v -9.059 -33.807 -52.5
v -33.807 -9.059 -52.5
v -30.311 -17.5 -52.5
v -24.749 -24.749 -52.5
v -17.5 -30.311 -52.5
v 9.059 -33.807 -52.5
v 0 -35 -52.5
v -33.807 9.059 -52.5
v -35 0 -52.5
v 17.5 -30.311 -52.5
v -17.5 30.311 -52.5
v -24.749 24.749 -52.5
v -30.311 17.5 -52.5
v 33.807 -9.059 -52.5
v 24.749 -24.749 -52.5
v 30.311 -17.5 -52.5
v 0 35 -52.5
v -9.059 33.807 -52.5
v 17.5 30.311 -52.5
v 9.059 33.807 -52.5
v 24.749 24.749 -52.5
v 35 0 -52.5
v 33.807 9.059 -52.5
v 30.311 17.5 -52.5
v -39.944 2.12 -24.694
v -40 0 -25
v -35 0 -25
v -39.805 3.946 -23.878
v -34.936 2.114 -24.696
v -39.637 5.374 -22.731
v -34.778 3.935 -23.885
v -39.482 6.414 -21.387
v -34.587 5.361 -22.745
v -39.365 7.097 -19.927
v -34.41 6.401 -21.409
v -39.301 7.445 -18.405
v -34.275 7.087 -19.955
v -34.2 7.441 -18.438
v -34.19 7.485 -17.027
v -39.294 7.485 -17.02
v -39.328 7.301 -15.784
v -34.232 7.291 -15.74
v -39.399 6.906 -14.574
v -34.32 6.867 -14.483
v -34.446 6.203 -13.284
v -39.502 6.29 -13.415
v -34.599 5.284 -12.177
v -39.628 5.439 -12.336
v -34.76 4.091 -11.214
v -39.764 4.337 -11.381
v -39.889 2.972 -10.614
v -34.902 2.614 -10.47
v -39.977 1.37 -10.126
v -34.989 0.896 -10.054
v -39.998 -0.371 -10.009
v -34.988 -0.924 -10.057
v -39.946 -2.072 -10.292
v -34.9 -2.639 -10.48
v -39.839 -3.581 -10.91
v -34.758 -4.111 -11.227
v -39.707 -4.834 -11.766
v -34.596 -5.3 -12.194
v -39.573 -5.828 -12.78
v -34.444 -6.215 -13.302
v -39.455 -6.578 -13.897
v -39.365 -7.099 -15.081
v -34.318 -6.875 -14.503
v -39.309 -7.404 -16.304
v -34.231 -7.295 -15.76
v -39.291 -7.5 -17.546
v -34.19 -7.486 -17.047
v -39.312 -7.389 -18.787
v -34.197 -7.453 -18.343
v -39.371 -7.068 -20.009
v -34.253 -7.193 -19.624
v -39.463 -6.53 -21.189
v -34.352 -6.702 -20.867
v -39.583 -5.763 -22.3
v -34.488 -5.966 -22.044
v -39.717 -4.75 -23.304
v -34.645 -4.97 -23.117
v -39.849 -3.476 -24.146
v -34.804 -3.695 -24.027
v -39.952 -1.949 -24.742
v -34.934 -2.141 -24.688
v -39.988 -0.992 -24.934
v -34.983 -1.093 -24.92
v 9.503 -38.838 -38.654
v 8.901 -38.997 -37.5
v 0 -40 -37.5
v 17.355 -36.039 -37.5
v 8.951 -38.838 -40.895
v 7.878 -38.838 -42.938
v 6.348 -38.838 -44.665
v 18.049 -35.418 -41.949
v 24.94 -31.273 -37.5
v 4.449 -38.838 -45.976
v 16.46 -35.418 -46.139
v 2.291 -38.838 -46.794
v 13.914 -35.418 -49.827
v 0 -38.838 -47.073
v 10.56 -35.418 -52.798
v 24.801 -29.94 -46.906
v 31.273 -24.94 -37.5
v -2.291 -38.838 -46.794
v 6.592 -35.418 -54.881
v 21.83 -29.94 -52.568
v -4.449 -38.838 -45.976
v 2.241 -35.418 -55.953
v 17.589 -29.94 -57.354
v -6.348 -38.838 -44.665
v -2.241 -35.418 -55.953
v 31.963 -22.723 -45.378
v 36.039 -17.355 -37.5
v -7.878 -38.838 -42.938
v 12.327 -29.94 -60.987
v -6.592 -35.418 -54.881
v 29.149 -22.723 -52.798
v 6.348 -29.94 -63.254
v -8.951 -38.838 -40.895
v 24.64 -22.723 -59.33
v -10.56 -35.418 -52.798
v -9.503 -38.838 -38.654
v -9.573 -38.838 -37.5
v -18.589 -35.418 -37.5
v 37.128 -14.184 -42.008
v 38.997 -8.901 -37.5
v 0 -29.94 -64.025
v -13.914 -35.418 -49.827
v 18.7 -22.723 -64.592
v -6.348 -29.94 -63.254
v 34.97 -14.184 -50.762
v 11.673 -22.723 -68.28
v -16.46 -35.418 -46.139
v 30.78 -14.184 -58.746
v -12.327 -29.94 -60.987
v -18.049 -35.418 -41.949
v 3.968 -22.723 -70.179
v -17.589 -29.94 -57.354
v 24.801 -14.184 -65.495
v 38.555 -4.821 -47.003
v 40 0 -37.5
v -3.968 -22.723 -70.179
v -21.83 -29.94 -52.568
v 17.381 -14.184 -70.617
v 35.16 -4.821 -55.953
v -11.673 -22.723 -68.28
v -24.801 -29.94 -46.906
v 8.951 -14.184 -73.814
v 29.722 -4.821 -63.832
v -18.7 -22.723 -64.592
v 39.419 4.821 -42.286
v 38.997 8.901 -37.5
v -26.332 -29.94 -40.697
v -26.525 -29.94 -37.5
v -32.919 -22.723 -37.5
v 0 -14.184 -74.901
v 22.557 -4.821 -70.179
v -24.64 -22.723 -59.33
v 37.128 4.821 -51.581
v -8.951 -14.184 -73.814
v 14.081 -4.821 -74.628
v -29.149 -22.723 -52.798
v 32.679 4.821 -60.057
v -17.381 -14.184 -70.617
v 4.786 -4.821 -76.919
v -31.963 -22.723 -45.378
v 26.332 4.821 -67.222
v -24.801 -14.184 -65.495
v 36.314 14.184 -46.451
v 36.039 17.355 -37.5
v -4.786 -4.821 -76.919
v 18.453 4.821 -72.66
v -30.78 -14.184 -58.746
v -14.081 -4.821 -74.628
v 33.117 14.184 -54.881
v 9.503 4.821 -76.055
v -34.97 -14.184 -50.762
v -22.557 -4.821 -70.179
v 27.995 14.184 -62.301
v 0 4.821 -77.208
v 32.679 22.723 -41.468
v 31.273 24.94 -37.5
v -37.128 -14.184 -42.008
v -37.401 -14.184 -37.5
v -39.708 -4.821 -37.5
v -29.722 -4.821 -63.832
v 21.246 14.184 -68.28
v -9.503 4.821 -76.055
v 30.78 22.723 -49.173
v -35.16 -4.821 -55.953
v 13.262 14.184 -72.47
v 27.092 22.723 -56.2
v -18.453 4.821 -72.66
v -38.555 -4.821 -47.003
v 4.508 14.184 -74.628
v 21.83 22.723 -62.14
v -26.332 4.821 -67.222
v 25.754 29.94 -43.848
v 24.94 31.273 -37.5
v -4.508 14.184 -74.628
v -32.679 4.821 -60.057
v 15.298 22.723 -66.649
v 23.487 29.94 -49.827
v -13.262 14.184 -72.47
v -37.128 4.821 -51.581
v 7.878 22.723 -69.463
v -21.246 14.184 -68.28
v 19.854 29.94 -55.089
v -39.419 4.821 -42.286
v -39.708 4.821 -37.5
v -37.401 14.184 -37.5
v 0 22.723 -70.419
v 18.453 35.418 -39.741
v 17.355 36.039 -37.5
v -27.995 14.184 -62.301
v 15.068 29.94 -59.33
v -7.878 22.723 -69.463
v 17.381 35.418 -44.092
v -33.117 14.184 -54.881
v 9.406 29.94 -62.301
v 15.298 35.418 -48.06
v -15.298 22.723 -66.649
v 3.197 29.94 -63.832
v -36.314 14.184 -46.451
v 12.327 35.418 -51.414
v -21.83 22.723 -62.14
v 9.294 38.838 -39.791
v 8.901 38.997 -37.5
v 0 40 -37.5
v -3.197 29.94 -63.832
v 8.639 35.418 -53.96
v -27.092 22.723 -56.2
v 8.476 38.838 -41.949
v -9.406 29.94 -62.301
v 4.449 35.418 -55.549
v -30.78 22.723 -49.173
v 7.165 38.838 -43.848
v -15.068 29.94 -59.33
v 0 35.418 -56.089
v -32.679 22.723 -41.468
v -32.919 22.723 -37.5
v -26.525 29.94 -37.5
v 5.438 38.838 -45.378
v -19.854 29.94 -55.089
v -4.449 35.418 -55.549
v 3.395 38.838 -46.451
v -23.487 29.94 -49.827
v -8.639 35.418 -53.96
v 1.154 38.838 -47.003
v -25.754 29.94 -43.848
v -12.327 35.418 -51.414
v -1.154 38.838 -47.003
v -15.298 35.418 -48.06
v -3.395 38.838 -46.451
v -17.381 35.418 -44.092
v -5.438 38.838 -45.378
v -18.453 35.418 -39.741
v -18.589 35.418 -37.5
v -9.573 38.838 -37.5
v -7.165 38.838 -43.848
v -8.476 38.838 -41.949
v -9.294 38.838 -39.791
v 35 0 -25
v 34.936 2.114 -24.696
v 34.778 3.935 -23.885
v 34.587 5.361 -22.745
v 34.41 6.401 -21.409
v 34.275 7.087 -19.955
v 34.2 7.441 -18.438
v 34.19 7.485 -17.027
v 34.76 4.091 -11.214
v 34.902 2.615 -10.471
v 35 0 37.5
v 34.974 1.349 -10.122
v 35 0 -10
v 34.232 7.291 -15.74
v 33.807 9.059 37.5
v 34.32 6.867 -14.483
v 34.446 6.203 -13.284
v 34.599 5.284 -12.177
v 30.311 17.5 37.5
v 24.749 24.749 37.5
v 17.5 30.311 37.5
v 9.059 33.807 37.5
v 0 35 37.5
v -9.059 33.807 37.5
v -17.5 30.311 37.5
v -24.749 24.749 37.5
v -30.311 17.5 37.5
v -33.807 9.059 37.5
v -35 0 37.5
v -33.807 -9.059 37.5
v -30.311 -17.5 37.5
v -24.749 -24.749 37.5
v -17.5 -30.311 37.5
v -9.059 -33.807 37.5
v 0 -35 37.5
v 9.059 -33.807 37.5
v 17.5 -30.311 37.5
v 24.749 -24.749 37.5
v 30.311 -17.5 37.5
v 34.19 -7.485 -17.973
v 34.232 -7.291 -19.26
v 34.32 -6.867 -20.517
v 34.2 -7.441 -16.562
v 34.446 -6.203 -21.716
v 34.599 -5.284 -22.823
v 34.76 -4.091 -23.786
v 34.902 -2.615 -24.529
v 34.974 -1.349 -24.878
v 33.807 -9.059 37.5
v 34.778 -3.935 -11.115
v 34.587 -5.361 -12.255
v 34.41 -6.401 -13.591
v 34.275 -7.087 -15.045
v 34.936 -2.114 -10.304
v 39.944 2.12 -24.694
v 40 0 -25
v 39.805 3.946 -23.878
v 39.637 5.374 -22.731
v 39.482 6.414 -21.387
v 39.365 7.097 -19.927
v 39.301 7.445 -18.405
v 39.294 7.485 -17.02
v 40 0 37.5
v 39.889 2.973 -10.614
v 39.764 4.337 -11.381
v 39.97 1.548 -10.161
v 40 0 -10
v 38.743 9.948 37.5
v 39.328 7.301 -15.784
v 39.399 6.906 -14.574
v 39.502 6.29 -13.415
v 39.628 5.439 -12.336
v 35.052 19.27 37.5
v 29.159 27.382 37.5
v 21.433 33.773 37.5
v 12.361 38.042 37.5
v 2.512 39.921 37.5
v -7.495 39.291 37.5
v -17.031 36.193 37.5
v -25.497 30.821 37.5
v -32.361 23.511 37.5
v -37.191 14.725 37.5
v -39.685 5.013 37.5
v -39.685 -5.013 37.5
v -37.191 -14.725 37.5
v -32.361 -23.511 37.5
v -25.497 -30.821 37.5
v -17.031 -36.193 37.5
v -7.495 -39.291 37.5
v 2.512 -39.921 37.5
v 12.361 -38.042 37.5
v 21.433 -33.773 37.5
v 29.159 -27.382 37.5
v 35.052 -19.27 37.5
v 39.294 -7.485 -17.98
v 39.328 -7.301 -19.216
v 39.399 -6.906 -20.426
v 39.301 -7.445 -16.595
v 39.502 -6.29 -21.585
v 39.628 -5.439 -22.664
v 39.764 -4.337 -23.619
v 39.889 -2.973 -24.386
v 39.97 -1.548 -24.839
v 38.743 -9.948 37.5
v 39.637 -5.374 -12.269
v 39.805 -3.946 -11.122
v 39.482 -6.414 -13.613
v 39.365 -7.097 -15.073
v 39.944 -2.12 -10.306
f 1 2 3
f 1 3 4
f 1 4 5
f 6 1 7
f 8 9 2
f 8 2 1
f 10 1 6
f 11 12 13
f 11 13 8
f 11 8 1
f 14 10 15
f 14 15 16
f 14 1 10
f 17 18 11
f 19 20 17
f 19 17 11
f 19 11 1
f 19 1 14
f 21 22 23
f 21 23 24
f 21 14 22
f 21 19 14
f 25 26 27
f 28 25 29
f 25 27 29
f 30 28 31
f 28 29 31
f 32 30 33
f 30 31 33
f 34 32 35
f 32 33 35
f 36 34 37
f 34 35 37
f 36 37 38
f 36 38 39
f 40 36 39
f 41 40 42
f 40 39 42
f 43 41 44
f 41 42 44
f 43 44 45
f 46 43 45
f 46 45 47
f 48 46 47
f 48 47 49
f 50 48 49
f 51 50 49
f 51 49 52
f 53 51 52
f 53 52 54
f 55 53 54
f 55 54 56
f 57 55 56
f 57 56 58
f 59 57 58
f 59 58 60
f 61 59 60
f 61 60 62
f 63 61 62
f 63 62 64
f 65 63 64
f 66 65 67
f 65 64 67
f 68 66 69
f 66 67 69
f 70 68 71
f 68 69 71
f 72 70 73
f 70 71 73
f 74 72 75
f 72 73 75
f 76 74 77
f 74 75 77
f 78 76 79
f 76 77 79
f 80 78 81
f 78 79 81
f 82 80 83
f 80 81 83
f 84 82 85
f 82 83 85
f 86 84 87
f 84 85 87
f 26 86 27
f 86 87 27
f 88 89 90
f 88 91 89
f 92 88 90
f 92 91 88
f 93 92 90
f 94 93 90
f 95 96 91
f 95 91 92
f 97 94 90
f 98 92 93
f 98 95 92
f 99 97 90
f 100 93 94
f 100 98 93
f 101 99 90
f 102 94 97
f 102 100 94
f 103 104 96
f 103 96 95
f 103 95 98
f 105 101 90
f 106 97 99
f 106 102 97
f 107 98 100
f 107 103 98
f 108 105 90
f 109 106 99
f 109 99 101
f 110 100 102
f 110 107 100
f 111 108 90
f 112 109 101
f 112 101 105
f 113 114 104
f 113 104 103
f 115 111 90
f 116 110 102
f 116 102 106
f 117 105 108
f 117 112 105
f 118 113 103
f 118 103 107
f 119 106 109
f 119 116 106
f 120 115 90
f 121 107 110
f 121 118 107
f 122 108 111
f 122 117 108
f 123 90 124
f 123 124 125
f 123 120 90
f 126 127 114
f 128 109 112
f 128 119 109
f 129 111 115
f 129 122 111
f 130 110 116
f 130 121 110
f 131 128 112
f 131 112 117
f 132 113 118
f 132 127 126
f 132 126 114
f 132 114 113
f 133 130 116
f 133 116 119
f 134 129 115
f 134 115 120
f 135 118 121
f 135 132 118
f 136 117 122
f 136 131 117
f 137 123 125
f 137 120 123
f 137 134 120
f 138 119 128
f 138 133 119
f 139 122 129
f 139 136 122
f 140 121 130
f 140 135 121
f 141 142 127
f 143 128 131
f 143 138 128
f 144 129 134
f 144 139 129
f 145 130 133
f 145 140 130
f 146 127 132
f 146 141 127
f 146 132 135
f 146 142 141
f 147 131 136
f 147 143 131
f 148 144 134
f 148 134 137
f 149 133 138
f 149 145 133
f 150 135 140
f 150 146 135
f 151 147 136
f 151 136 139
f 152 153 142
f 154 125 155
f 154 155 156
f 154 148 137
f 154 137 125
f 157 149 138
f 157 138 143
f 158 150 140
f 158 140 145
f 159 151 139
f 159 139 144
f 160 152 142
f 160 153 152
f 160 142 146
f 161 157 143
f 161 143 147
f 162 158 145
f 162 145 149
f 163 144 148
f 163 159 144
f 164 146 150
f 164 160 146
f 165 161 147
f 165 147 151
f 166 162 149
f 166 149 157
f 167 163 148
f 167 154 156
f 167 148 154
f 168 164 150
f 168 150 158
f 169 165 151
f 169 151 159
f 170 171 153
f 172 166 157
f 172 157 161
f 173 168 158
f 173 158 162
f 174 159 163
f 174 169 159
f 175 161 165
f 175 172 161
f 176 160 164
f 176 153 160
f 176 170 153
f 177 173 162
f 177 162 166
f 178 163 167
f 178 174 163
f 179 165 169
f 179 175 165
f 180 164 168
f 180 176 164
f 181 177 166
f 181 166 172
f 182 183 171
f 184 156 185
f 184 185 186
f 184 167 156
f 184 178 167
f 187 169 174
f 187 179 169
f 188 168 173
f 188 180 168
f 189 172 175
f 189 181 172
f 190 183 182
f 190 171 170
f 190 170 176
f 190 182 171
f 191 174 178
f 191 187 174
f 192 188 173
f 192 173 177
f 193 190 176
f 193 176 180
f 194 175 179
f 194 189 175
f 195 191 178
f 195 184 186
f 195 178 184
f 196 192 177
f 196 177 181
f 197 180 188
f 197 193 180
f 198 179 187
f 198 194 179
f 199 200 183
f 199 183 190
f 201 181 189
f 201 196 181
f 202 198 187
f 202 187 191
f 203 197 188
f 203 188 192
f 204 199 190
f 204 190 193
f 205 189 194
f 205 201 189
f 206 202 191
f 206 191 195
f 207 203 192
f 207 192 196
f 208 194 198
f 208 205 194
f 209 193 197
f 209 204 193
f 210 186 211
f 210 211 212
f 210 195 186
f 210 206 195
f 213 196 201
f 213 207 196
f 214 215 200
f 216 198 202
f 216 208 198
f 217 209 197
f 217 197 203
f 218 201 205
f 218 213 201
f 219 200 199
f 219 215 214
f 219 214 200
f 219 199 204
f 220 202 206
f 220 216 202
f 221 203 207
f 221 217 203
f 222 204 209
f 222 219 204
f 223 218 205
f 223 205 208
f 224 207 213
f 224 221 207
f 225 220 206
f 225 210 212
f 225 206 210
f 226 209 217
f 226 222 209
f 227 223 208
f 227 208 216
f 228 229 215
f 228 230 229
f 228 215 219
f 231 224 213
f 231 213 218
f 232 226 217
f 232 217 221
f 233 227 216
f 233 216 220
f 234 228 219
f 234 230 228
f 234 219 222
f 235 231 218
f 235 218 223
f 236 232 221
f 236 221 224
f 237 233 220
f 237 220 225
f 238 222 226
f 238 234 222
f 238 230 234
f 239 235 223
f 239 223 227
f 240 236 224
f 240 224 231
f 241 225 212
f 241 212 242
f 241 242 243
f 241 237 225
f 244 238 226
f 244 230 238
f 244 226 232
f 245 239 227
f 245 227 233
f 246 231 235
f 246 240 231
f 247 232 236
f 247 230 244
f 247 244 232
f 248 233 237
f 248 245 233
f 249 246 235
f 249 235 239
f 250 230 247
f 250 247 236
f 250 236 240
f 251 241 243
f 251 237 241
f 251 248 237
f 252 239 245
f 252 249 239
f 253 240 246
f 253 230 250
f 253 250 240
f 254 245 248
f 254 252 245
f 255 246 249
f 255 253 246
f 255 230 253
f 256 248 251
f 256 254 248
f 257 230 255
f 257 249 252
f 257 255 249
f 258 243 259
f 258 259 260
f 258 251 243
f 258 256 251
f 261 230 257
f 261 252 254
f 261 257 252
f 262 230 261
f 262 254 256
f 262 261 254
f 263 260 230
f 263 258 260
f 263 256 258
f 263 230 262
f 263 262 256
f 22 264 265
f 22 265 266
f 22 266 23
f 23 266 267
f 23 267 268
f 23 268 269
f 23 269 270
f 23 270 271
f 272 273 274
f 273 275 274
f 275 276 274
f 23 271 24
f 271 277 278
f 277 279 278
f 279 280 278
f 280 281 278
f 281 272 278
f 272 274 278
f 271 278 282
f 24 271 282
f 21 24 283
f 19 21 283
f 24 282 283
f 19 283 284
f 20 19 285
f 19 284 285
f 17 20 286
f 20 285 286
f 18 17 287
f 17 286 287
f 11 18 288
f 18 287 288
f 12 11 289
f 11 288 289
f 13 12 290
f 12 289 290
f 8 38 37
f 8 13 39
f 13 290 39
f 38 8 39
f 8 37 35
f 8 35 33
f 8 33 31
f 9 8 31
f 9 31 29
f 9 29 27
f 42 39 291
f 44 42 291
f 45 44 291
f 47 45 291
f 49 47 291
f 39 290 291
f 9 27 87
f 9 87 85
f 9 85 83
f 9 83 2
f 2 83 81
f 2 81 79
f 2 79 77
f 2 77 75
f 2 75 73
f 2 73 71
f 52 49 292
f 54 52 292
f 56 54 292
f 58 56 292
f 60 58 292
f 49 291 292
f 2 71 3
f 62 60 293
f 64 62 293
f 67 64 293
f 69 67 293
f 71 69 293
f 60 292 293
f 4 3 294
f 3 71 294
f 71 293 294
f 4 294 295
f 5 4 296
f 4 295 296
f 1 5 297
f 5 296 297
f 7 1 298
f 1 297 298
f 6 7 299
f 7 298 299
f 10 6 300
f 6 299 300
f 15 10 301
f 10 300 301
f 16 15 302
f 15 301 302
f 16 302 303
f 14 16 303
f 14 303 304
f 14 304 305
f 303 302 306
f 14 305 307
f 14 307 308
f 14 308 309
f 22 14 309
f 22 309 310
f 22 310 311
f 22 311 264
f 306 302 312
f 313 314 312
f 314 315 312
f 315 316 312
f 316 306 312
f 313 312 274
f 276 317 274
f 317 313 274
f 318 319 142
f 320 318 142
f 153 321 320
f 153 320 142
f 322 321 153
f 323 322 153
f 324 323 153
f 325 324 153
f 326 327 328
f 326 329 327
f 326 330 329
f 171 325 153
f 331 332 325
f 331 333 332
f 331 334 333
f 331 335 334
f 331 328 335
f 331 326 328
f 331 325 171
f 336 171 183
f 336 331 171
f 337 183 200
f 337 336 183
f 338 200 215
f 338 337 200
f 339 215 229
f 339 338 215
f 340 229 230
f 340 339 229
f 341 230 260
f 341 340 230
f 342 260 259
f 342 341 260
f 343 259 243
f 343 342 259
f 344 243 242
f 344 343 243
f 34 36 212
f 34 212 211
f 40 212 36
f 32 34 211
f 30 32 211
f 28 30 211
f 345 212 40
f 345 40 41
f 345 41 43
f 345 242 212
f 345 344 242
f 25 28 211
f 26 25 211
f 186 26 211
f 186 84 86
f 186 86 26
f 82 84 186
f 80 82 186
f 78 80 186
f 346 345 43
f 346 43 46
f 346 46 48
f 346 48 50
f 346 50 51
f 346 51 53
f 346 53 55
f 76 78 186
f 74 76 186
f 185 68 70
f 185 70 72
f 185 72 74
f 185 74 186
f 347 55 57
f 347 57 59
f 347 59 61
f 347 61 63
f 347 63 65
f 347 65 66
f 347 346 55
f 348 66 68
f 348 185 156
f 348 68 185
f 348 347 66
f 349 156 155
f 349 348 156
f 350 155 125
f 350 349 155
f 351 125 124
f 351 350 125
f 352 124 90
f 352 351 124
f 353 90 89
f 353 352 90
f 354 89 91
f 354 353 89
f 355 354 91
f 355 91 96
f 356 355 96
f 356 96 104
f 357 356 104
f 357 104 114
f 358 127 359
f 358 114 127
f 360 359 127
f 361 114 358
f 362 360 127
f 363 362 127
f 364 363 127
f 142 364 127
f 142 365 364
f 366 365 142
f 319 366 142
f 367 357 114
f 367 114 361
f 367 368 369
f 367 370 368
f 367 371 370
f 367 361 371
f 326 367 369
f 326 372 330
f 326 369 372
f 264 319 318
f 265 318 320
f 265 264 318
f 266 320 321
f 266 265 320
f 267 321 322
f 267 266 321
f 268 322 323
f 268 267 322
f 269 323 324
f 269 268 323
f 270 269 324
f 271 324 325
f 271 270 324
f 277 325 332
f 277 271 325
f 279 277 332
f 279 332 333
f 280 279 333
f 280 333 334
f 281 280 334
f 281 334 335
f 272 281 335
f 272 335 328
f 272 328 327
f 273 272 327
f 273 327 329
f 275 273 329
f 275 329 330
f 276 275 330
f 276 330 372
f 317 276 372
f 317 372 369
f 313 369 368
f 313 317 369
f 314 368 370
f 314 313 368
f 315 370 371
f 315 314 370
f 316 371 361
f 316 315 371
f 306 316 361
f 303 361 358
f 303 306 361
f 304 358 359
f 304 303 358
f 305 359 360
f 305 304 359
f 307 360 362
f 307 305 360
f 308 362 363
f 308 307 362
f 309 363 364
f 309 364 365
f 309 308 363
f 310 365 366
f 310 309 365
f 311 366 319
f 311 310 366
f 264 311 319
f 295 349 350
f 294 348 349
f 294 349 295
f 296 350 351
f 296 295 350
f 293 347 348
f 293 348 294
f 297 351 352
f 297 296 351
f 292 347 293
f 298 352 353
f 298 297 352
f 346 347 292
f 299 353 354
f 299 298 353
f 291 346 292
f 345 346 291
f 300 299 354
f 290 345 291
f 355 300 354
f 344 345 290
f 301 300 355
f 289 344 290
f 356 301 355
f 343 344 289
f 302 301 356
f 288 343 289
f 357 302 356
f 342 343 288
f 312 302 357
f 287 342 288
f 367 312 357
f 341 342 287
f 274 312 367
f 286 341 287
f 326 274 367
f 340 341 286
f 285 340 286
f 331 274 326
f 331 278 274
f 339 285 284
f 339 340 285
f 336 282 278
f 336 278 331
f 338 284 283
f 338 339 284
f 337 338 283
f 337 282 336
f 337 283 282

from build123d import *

# Parameters (mm, degrees)
SKETCH1_R               = 40
BOSS_EXTRUDE1_DEPTH     = 37.5
SKETCH3_R               = 7.5
CUT_EXTRUDE2_DEPTH      = 41
CUT_EXTRUDE2_DEPTH_BACK = 41
REVOLVE1_ANGLE          = 180
SKETCH2_R               = 35
CUT_EXTRUDE3_DEPTH      = 90


with BuildPart() as part:
    # Sketch1 → Boss-Extrude1 (new body, symmetric)
    with BuildSketch(Plane.XY):
        Circle(SKETCH1_R)
    extrude(amount=BOSS_EXTRUDE1_DEPTH, both=True)

    # Sketch3 → Cut-Extrude2 (cut, two sides)
    with BuildSketch(Plane(origin=(0, 0, 0), x_dir=(0, 0, -1), z_dir=(1, 0, 0))) as cut_extrude2_sk:
        with Locations((17.5, 0)):
            Circle(SKETCH3_R)
    extrude(amount=CUT_EXTRUDE2_DEPTH, mode=Mode.SUBTRACT)
    extrude(cut_extrude2_sk.sketch, amount=-CUT_EXTRUDE2_DEPTH_BACK, mode=Mode.SUBTRACT)

    # Sketch7 → Revolve1 (revolve)
    with BuildSketch(Plane(origin=(0, 0, -37.5), x_dir=(-1, 0, 0), z_dir=(0, 0, -1))):
        with BuildLine():
            Line((0, 40), (0, -40))
            ThreePointArc((0, -40), (-40, 0), (0, 40))
        make_face()
    revolve(axis=Axis((0, 40, -37.5), (0, 1, 0)), revolution_arc=REVOLVE1_ANGLE)

    # Sketch2 → Cut-Extrude3 (cut)
    with BuildSketch(Plane.XY.offset(37.5)):
        Circle(SKETCH2_R)
    extrude(amount=-CUT_EXTRUDE3_DEPTH, mode=Mode.SUBTRACT)


solid = part.part
